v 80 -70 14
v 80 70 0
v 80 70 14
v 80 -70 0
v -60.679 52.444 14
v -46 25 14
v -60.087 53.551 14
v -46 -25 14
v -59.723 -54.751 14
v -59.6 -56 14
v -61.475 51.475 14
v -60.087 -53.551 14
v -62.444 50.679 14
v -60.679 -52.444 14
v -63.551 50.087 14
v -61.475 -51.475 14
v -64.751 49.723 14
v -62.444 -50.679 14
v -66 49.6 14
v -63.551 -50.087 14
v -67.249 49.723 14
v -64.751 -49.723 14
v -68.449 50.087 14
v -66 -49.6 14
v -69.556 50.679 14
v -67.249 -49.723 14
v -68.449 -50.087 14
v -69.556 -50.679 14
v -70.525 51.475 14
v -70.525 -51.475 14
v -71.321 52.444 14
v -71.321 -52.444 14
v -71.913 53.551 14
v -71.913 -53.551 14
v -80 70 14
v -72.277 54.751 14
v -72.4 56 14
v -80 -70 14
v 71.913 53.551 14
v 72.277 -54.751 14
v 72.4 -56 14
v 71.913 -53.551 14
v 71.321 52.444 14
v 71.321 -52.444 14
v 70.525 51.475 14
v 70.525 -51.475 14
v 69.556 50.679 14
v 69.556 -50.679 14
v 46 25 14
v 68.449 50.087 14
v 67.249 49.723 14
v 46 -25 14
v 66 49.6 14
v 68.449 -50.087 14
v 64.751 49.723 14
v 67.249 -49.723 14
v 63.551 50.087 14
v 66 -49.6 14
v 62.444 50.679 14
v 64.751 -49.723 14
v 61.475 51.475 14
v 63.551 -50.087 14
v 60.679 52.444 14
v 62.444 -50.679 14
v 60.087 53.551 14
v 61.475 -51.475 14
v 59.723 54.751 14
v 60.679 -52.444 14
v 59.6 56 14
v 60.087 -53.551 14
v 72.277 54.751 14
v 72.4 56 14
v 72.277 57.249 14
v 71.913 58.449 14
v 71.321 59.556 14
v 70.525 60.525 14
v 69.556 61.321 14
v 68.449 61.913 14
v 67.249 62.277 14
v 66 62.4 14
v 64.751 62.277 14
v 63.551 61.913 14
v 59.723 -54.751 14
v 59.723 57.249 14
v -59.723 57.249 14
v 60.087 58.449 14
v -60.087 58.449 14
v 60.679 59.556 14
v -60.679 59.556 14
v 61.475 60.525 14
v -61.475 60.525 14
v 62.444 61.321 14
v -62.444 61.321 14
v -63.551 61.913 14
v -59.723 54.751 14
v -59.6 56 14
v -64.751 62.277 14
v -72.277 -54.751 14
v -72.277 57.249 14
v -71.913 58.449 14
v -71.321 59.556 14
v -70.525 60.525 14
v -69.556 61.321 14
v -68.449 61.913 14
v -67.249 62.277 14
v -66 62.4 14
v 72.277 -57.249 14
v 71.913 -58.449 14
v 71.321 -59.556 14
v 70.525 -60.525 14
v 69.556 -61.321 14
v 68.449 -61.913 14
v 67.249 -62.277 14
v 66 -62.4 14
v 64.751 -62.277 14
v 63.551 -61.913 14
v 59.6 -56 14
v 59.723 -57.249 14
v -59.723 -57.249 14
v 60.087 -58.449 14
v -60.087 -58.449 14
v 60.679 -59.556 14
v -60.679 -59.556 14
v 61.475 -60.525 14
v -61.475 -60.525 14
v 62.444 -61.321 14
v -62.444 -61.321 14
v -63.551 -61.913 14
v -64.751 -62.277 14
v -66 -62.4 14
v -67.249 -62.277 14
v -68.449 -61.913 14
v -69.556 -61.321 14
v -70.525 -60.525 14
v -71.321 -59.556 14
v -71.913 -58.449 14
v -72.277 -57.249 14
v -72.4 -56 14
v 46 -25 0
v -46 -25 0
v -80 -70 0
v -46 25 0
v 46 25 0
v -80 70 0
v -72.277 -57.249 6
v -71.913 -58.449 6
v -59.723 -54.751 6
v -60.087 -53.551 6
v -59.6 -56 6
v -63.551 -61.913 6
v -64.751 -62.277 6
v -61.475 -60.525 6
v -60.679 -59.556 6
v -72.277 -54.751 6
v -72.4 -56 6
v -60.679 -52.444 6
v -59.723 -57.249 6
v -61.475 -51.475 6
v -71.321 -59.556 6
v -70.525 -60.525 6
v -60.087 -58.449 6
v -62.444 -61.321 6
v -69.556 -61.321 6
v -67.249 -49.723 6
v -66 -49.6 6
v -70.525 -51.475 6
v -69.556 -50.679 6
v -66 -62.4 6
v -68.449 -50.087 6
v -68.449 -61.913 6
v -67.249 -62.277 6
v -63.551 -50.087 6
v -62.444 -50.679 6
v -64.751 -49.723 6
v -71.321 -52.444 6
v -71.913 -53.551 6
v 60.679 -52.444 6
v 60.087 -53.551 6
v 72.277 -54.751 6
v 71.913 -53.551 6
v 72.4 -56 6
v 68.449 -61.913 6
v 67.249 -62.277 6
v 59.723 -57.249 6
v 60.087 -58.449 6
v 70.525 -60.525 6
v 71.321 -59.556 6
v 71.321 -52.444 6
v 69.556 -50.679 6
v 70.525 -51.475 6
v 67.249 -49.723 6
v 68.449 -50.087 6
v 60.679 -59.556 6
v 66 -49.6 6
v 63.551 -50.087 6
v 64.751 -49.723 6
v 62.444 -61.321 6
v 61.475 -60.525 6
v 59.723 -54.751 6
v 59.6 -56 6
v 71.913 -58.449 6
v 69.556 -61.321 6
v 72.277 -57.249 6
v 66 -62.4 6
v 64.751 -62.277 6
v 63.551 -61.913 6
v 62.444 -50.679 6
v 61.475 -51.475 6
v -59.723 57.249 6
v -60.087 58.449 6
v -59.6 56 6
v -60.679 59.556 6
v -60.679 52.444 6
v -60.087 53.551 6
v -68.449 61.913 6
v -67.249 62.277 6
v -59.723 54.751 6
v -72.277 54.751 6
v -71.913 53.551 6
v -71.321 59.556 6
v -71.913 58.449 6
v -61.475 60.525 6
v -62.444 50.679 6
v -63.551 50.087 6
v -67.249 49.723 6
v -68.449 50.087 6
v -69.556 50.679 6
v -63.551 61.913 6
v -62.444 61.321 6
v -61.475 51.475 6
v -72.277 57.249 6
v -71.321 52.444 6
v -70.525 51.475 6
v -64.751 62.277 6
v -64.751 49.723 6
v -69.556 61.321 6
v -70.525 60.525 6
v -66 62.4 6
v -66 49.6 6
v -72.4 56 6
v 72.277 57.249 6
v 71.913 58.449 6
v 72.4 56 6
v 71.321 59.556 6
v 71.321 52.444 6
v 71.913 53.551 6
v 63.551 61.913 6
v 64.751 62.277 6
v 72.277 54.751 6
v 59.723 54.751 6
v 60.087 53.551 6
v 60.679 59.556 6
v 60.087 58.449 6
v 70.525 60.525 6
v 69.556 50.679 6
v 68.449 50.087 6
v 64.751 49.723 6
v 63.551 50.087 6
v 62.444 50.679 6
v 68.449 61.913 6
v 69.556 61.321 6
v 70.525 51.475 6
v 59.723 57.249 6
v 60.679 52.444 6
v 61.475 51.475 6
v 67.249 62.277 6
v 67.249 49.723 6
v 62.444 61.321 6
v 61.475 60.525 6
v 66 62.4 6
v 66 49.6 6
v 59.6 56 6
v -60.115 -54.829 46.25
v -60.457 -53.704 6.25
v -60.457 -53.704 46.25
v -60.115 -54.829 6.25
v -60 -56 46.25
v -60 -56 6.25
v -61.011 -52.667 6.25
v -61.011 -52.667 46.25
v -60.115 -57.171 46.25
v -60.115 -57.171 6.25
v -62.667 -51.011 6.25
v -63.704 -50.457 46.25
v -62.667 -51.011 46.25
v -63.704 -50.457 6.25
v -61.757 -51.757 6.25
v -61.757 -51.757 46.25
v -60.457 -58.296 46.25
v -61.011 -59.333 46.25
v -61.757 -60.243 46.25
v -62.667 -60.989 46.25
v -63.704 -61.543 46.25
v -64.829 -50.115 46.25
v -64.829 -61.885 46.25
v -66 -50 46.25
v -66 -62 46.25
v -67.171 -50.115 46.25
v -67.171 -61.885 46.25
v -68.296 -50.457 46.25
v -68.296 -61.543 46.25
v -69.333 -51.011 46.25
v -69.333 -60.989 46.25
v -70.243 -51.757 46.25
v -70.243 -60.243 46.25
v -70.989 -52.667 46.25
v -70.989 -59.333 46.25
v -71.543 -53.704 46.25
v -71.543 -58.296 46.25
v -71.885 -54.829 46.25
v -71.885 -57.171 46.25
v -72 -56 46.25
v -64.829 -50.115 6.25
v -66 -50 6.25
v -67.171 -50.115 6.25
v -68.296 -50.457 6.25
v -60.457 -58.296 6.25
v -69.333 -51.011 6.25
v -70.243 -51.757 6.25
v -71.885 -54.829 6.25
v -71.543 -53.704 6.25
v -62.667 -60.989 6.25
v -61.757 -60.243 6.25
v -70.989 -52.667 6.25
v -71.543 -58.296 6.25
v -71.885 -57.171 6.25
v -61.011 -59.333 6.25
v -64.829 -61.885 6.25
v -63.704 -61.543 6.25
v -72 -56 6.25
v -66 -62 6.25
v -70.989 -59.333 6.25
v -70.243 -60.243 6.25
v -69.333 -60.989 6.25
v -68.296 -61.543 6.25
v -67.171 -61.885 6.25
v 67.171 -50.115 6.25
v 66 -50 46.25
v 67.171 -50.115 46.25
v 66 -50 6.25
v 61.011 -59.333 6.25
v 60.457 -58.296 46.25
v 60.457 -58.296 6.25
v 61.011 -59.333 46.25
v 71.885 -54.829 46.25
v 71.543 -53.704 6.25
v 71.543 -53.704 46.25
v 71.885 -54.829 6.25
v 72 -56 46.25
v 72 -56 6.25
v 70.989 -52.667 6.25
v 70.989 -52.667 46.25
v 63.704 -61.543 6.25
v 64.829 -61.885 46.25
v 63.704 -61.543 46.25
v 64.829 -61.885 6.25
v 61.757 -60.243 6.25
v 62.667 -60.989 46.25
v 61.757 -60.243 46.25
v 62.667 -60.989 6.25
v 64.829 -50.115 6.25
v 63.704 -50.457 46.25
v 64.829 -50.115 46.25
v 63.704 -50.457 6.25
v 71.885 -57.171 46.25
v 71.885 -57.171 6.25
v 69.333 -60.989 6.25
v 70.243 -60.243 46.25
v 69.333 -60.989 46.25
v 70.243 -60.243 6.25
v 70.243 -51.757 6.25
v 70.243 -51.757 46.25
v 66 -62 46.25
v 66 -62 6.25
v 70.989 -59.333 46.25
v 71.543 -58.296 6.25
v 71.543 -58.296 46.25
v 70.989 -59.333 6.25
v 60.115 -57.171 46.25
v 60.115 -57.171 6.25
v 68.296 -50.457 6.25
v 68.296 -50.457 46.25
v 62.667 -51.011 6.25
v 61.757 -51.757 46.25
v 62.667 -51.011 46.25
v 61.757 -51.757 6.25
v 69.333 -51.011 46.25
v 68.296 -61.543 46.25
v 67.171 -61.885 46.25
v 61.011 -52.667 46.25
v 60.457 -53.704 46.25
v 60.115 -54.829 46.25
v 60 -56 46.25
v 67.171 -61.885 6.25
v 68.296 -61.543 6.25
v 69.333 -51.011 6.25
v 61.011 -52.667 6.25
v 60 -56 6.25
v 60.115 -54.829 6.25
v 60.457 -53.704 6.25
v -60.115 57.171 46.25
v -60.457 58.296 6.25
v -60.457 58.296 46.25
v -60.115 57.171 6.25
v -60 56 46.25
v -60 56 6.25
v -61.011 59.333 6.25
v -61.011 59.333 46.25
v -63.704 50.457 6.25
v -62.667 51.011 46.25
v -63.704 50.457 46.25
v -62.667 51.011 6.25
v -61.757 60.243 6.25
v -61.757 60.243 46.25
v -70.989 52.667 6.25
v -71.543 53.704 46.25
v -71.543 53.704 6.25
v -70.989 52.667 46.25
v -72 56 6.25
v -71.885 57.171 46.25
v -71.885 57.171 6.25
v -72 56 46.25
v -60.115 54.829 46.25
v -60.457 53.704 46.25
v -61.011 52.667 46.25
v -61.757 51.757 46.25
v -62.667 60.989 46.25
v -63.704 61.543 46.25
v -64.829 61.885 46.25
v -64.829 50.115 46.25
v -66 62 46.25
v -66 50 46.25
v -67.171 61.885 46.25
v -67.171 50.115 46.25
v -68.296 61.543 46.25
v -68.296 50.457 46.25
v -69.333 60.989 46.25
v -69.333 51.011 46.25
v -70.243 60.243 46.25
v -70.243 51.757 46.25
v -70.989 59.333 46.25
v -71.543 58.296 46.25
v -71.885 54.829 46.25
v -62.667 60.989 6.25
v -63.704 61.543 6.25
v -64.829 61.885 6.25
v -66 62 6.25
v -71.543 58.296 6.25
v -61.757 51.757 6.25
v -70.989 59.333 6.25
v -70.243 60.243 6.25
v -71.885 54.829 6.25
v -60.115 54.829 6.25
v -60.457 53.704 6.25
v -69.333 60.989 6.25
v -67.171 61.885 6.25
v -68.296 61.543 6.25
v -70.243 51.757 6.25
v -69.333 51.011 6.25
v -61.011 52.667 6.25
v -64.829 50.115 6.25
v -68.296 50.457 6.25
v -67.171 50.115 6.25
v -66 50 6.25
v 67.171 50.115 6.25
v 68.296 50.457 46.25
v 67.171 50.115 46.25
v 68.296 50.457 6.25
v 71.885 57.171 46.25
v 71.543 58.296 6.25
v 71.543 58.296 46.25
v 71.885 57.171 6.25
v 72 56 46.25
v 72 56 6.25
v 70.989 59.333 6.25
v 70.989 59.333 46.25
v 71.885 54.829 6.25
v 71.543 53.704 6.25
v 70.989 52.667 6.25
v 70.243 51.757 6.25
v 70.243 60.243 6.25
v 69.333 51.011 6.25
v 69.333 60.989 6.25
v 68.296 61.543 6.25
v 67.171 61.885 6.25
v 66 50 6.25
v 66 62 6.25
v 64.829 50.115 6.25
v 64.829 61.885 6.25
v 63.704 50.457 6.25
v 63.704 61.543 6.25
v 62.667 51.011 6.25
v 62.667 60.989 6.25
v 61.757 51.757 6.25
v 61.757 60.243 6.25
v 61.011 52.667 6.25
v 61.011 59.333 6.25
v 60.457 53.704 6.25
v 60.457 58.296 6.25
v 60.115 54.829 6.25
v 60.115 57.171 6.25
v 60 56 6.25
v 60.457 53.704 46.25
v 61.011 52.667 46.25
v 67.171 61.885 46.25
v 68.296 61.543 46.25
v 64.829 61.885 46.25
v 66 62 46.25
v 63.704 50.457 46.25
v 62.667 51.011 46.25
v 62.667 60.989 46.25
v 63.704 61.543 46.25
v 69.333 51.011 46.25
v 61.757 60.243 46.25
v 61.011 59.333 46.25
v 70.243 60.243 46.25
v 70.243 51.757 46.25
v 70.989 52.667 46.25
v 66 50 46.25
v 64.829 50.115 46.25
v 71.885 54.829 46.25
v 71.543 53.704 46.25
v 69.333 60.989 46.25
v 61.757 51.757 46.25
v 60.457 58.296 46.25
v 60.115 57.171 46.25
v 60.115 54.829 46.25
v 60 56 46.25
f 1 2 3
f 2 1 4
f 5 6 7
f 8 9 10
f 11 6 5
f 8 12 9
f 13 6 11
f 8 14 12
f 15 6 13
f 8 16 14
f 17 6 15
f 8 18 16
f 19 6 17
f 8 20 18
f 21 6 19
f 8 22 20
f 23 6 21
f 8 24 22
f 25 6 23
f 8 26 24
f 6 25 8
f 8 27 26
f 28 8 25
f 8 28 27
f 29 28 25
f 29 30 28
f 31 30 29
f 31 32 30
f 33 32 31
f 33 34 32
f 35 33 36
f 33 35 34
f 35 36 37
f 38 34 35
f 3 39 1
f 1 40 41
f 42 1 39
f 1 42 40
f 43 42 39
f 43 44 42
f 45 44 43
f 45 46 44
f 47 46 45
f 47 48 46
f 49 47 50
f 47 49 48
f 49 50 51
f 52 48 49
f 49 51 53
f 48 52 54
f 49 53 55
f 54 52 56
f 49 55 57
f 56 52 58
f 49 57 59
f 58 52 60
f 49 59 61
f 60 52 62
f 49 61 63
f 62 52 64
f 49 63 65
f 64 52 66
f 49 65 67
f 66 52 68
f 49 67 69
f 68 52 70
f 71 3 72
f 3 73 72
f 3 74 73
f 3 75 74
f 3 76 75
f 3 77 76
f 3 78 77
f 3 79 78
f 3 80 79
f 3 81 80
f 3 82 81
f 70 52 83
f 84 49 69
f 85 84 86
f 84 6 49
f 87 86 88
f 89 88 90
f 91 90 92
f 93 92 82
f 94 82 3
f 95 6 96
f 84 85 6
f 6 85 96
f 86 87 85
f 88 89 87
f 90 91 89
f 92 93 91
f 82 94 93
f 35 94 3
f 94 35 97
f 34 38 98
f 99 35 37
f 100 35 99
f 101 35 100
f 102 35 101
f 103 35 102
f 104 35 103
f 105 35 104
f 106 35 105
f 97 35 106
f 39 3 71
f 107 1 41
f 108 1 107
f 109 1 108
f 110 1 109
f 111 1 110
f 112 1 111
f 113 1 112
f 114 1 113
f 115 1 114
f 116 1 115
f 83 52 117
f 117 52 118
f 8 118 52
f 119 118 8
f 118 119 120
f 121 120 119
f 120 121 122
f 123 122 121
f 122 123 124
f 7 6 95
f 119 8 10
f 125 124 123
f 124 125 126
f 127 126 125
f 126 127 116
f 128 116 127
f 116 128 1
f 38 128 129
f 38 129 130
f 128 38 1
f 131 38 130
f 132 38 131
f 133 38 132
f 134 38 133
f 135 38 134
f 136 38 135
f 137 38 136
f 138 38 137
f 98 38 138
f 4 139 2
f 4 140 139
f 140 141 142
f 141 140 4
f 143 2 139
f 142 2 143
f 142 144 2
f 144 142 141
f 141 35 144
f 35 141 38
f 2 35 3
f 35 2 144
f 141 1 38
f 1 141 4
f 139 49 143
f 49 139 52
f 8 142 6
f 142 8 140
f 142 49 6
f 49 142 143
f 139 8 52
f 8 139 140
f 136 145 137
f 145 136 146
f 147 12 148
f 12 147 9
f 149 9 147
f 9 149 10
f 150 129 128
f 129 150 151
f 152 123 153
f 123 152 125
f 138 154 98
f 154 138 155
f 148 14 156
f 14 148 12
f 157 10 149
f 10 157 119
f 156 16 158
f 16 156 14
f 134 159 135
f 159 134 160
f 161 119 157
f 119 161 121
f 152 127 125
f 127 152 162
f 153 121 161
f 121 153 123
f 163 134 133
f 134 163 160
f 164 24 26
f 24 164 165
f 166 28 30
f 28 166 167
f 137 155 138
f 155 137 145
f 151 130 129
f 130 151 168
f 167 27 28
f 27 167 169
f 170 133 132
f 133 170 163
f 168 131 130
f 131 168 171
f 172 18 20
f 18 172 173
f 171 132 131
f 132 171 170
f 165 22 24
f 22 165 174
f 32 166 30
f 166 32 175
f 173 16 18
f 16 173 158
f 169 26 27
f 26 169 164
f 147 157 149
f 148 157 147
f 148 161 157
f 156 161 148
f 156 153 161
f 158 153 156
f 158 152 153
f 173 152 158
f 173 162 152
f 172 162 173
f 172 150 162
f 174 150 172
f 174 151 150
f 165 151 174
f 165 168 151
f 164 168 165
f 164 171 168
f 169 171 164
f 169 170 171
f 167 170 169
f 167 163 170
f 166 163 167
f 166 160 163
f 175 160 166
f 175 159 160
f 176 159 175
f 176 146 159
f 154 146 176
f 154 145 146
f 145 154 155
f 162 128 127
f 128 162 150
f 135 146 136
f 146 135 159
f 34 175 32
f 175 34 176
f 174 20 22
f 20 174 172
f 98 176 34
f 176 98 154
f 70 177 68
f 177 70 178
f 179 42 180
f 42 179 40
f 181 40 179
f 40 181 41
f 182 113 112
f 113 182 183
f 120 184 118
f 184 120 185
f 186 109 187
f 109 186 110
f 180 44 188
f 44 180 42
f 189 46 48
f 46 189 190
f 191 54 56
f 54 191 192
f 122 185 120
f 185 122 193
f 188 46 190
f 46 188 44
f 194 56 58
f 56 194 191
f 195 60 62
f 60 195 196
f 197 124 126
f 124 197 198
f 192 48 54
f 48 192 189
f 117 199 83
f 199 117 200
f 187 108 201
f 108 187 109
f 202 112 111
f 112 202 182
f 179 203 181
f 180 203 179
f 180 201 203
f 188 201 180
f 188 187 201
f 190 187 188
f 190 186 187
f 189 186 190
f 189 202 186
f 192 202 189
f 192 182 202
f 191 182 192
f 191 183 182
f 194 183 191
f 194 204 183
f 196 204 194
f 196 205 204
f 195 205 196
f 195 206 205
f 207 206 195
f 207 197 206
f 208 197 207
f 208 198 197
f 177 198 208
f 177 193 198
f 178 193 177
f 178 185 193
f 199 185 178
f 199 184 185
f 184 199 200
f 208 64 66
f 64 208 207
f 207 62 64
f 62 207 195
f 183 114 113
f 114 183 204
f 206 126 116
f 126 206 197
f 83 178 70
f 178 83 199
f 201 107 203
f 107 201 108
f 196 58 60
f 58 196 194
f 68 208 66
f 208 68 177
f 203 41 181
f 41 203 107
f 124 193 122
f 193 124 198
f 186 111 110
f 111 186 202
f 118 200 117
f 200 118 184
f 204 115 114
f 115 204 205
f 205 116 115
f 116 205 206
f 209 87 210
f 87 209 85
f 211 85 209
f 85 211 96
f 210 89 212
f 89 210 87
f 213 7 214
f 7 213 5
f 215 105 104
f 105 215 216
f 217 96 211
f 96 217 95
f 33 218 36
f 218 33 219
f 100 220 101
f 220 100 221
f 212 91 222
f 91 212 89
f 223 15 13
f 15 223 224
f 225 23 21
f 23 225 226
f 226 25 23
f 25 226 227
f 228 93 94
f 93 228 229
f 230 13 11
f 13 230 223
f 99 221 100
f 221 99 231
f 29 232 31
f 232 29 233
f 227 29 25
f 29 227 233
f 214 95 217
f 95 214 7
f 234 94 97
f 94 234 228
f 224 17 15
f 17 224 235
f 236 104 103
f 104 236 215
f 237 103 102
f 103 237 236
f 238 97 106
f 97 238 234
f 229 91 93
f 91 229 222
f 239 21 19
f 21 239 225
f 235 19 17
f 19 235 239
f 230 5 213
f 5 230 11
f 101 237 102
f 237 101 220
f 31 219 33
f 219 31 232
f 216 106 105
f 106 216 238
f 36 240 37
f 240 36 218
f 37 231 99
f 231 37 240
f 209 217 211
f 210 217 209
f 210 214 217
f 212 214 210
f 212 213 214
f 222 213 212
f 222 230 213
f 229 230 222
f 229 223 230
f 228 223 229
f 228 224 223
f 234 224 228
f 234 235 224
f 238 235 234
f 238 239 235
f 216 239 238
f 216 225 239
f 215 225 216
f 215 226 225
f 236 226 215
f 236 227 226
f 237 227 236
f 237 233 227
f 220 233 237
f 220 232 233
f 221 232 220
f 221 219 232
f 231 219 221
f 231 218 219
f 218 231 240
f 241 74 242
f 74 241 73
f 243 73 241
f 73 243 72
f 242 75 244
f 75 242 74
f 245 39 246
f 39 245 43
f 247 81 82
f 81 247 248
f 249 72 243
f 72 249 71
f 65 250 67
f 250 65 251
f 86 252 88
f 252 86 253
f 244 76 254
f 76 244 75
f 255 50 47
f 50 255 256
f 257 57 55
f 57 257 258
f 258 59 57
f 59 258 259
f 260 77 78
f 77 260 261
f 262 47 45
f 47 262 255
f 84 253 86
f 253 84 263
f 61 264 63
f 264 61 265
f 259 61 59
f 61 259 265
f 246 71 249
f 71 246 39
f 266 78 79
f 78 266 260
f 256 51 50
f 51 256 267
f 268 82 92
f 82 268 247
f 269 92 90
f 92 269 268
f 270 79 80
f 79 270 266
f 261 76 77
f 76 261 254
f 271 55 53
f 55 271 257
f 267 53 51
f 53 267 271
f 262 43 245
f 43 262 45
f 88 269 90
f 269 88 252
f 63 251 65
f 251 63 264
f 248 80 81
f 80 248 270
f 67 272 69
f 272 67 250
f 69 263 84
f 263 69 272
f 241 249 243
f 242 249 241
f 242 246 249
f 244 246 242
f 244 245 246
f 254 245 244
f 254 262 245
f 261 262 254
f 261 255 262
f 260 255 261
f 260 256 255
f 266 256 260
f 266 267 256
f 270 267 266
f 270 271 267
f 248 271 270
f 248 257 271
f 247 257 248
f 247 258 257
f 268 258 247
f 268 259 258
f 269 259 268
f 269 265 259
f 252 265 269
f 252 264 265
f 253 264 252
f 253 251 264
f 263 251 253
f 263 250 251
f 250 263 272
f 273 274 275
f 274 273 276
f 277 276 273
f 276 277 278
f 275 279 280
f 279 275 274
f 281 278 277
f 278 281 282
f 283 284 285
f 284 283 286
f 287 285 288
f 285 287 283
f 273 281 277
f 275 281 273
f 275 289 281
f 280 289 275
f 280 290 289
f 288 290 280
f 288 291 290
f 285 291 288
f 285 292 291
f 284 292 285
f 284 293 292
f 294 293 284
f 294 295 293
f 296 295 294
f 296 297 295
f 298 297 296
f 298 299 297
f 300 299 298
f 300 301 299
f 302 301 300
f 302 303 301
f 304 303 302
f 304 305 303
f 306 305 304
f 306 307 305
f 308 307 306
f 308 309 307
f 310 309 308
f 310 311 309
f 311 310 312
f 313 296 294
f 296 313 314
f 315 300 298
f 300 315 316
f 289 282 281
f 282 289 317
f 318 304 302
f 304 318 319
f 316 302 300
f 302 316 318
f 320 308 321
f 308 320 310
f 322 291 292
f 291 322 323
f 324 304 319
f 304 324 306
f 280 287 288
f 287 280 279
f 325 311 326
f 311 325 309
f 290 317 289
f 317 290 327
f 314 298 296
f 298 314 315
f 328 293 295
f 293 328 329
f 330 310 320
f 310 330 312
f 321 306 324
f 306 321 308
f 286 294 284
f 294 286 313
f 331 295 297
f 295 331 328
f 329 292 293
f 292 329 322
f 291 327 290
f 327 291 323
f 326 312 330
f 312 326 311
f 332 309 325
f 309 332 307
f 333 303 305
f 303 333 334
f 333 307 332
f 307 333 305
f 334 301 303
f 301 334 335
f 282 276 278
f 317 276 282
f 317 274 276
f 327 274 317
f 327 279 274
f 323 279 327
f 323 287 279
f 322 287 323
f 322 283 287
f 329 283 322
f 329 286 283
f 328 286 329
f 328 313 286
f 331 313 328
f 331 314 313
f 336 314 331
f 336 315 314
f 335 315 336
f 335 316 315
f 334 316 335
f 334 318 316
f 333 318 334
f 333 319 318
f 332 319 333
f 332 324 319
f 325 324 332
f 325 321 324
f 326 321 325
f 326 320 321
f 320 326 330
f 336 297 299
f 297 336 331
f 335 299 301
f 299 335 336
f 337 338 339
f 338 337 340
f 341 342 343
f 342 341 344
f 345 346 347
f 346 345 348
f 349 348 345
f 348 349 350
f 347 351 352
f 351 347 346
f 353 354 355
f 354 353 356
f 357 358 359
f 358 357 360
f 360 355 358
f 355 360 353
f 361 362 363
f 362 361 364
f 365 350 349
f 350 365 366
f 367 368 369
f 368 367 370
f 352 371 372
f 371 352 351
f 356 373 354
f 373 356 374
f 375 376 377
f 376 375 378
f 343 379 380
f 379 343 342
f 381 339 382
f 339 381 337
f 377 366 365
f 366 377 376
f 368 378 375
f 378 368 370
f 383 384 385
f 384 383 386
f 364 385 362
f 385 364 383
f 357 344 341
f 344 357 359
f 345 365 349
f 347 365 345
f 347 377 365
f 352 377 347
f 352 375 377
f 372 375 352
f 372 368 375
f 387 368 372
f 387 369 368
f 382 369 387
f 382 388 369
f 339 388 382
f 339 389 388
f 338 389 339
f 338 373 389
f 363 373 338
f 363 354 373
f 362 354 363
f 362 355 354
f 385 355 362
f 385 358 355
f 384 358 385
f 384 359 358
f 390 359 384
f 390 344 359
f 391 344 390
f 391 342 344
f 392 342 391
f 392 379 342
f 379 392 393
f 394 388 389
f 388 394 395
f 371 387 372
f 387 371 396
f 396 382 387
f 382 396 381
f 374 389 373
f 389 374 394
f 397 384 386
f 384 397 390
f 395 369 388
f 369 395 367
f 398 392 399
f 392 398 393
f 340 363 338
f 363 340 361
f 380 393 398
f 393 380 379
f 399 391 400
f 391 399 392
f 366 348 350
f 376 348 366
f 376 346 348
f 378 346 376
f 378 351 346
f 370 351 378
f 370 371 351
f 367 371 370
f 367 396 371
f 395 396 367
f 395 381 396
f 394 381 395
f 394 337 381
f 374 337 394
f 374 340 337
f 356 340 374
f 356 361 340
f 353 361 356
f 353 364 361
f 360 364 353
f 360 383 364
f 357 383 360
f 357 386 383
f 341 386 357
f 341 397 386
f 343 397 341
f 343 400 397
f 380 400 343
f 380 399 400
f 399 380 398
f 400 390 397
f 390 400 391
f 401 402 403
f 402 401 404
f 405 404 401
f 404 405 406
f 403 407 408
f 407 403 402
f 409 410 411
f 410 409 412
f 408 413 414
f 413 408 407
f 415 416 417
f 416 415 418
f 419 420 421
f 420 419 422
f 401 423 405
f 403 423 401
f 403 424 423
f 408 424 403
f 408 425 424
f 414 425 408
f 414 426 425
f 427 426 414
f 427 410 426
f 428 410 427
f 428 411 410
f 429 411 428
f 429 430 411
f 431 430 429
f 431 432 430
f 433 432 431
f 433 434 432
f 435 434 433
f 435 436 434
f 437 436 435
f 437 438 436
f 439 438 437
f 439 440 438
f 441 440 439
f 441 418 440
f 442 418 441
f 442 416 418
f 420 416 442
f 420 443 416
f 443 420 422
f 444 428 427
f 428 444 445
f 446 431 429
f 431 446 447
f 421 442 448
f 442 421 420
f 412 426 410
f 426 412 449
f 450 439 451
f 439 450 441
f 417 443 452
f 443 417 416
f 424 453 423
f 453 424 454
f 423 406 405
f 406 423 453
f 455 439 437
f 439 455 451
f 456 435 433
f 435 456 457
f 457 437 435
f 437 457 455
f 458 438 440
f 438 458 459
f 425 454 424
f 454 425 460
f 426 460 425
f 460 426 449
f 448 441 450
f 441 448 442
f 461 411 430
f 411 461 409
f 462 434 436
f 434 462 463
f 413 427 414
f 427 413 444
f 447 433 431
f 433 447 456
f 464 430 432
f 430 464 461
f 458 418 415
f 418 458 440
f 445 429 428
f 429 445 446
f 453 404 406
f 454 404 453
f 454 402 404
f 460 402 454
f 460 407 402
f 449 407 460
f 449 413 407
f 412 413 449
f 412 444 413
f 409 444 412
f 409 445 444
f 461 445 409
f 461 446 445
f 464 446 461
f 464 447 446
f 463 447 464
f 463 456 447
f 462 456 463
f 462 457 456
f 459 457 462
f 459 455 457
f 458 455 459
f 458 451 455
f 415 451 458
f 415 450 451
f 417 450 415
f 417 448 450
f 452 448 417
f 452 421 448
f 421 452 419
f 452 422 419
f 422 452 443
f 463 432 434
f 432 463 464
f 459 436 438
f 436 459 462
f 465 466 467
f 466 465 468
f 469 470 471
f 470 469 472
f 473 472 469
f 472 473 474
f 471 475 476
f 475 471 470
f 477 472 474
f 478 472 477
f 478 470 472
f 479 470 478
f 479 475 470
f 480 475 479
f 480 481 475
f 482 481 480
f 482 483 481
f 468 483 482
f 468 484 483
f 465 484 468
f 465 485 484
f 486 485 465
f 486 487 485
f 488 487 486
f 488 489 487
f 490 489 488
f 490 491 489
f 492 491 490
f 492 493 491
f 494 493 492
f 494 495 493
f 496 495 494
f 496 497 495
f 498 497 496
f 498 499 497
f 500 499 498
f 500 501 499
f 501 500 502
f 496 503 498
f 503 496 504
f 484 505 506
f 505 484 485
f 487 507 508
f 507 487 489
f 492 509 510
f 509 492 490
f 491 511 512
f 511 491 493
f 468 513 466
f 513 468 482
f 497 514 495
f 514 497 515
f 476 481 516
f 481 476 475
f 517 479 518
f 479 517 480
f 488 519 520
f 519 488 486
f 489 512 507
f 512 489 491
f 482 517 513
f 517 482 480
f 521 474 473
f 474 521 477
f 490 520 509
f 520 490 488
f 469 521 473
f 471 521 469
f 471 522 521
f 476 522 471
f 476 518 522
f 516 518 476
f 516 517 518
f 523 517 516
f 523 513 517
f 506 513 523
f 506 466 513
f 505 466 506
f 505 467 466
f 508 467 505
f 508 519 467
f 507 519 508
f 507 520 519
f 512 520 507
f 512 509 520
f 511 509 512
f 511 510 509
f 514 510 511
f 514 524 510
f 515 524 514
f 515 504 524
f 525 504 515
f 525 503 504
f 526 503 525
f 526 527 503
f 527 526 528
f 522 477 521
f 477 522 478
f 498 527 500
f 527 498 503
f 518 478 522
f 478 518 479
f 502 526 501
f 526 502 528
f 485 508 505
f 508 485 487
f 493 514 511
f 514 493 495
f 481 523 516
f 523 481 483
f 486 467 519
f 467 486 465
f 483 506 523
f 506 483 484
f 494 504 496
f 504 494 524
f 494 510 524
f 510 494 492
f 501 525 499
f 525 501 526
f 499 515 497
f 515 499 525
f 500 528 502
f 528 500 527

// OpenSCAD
$fn = 32;

// ------------------------------------------------------------------------
// Frame with four posts: 160 x 140 mm frame, four d12 posts
// Every part is its own module, assembly() places them once.
// ------------------------------------------------------------------------

// --- part 1 ---
module base_frame() {
  difference() {
    translate([-80, -70, 0]) cube([160, 140, 14]);
    translate([-46, -25, -1]) cube([92, 50, 16]);
    translate([-66, -56, 6]) cylinder(h = 9, d = 12.8);
    translate([66, -56, 6]) cylinder(h = 9, d = 12.8);
    translate([-66, 56, 6]) cylinder(h = 9, d = 12.8);
    translate([66, 56, 6]) cylinder(h = 9, d = 12.8);
  }
}

// --- part 2 ---
module post1() {
  cylinder(h = 40, d = 12);
}

// --- part 3 ---
module post2() {
  cylinder(h = 40, d = 12);
}

// --- part 4 ---
module post3() {
  cylinder(h = 40, d = 12);
}

// --- part 5 ---
module post4() {
  cylinder(h = 40, d = 12);
}

// --- assembly ---
module assembly() {
  translate([0, 0, 0]) rotate([0, 0, 0]) base_frame();
  translate([-66, -56, 6.25]) rotate([0, 0, 0]) post1();
  translate([66, -56, 6.25]) rotate([0, 0, 0]) post2();
  translate([-66, 56, 6.25]) rotate([0, 0, 0]) post3();
  translate([66, 56, 6.25]) rotate([0, 0, 0]) post4();
}

assembly();
